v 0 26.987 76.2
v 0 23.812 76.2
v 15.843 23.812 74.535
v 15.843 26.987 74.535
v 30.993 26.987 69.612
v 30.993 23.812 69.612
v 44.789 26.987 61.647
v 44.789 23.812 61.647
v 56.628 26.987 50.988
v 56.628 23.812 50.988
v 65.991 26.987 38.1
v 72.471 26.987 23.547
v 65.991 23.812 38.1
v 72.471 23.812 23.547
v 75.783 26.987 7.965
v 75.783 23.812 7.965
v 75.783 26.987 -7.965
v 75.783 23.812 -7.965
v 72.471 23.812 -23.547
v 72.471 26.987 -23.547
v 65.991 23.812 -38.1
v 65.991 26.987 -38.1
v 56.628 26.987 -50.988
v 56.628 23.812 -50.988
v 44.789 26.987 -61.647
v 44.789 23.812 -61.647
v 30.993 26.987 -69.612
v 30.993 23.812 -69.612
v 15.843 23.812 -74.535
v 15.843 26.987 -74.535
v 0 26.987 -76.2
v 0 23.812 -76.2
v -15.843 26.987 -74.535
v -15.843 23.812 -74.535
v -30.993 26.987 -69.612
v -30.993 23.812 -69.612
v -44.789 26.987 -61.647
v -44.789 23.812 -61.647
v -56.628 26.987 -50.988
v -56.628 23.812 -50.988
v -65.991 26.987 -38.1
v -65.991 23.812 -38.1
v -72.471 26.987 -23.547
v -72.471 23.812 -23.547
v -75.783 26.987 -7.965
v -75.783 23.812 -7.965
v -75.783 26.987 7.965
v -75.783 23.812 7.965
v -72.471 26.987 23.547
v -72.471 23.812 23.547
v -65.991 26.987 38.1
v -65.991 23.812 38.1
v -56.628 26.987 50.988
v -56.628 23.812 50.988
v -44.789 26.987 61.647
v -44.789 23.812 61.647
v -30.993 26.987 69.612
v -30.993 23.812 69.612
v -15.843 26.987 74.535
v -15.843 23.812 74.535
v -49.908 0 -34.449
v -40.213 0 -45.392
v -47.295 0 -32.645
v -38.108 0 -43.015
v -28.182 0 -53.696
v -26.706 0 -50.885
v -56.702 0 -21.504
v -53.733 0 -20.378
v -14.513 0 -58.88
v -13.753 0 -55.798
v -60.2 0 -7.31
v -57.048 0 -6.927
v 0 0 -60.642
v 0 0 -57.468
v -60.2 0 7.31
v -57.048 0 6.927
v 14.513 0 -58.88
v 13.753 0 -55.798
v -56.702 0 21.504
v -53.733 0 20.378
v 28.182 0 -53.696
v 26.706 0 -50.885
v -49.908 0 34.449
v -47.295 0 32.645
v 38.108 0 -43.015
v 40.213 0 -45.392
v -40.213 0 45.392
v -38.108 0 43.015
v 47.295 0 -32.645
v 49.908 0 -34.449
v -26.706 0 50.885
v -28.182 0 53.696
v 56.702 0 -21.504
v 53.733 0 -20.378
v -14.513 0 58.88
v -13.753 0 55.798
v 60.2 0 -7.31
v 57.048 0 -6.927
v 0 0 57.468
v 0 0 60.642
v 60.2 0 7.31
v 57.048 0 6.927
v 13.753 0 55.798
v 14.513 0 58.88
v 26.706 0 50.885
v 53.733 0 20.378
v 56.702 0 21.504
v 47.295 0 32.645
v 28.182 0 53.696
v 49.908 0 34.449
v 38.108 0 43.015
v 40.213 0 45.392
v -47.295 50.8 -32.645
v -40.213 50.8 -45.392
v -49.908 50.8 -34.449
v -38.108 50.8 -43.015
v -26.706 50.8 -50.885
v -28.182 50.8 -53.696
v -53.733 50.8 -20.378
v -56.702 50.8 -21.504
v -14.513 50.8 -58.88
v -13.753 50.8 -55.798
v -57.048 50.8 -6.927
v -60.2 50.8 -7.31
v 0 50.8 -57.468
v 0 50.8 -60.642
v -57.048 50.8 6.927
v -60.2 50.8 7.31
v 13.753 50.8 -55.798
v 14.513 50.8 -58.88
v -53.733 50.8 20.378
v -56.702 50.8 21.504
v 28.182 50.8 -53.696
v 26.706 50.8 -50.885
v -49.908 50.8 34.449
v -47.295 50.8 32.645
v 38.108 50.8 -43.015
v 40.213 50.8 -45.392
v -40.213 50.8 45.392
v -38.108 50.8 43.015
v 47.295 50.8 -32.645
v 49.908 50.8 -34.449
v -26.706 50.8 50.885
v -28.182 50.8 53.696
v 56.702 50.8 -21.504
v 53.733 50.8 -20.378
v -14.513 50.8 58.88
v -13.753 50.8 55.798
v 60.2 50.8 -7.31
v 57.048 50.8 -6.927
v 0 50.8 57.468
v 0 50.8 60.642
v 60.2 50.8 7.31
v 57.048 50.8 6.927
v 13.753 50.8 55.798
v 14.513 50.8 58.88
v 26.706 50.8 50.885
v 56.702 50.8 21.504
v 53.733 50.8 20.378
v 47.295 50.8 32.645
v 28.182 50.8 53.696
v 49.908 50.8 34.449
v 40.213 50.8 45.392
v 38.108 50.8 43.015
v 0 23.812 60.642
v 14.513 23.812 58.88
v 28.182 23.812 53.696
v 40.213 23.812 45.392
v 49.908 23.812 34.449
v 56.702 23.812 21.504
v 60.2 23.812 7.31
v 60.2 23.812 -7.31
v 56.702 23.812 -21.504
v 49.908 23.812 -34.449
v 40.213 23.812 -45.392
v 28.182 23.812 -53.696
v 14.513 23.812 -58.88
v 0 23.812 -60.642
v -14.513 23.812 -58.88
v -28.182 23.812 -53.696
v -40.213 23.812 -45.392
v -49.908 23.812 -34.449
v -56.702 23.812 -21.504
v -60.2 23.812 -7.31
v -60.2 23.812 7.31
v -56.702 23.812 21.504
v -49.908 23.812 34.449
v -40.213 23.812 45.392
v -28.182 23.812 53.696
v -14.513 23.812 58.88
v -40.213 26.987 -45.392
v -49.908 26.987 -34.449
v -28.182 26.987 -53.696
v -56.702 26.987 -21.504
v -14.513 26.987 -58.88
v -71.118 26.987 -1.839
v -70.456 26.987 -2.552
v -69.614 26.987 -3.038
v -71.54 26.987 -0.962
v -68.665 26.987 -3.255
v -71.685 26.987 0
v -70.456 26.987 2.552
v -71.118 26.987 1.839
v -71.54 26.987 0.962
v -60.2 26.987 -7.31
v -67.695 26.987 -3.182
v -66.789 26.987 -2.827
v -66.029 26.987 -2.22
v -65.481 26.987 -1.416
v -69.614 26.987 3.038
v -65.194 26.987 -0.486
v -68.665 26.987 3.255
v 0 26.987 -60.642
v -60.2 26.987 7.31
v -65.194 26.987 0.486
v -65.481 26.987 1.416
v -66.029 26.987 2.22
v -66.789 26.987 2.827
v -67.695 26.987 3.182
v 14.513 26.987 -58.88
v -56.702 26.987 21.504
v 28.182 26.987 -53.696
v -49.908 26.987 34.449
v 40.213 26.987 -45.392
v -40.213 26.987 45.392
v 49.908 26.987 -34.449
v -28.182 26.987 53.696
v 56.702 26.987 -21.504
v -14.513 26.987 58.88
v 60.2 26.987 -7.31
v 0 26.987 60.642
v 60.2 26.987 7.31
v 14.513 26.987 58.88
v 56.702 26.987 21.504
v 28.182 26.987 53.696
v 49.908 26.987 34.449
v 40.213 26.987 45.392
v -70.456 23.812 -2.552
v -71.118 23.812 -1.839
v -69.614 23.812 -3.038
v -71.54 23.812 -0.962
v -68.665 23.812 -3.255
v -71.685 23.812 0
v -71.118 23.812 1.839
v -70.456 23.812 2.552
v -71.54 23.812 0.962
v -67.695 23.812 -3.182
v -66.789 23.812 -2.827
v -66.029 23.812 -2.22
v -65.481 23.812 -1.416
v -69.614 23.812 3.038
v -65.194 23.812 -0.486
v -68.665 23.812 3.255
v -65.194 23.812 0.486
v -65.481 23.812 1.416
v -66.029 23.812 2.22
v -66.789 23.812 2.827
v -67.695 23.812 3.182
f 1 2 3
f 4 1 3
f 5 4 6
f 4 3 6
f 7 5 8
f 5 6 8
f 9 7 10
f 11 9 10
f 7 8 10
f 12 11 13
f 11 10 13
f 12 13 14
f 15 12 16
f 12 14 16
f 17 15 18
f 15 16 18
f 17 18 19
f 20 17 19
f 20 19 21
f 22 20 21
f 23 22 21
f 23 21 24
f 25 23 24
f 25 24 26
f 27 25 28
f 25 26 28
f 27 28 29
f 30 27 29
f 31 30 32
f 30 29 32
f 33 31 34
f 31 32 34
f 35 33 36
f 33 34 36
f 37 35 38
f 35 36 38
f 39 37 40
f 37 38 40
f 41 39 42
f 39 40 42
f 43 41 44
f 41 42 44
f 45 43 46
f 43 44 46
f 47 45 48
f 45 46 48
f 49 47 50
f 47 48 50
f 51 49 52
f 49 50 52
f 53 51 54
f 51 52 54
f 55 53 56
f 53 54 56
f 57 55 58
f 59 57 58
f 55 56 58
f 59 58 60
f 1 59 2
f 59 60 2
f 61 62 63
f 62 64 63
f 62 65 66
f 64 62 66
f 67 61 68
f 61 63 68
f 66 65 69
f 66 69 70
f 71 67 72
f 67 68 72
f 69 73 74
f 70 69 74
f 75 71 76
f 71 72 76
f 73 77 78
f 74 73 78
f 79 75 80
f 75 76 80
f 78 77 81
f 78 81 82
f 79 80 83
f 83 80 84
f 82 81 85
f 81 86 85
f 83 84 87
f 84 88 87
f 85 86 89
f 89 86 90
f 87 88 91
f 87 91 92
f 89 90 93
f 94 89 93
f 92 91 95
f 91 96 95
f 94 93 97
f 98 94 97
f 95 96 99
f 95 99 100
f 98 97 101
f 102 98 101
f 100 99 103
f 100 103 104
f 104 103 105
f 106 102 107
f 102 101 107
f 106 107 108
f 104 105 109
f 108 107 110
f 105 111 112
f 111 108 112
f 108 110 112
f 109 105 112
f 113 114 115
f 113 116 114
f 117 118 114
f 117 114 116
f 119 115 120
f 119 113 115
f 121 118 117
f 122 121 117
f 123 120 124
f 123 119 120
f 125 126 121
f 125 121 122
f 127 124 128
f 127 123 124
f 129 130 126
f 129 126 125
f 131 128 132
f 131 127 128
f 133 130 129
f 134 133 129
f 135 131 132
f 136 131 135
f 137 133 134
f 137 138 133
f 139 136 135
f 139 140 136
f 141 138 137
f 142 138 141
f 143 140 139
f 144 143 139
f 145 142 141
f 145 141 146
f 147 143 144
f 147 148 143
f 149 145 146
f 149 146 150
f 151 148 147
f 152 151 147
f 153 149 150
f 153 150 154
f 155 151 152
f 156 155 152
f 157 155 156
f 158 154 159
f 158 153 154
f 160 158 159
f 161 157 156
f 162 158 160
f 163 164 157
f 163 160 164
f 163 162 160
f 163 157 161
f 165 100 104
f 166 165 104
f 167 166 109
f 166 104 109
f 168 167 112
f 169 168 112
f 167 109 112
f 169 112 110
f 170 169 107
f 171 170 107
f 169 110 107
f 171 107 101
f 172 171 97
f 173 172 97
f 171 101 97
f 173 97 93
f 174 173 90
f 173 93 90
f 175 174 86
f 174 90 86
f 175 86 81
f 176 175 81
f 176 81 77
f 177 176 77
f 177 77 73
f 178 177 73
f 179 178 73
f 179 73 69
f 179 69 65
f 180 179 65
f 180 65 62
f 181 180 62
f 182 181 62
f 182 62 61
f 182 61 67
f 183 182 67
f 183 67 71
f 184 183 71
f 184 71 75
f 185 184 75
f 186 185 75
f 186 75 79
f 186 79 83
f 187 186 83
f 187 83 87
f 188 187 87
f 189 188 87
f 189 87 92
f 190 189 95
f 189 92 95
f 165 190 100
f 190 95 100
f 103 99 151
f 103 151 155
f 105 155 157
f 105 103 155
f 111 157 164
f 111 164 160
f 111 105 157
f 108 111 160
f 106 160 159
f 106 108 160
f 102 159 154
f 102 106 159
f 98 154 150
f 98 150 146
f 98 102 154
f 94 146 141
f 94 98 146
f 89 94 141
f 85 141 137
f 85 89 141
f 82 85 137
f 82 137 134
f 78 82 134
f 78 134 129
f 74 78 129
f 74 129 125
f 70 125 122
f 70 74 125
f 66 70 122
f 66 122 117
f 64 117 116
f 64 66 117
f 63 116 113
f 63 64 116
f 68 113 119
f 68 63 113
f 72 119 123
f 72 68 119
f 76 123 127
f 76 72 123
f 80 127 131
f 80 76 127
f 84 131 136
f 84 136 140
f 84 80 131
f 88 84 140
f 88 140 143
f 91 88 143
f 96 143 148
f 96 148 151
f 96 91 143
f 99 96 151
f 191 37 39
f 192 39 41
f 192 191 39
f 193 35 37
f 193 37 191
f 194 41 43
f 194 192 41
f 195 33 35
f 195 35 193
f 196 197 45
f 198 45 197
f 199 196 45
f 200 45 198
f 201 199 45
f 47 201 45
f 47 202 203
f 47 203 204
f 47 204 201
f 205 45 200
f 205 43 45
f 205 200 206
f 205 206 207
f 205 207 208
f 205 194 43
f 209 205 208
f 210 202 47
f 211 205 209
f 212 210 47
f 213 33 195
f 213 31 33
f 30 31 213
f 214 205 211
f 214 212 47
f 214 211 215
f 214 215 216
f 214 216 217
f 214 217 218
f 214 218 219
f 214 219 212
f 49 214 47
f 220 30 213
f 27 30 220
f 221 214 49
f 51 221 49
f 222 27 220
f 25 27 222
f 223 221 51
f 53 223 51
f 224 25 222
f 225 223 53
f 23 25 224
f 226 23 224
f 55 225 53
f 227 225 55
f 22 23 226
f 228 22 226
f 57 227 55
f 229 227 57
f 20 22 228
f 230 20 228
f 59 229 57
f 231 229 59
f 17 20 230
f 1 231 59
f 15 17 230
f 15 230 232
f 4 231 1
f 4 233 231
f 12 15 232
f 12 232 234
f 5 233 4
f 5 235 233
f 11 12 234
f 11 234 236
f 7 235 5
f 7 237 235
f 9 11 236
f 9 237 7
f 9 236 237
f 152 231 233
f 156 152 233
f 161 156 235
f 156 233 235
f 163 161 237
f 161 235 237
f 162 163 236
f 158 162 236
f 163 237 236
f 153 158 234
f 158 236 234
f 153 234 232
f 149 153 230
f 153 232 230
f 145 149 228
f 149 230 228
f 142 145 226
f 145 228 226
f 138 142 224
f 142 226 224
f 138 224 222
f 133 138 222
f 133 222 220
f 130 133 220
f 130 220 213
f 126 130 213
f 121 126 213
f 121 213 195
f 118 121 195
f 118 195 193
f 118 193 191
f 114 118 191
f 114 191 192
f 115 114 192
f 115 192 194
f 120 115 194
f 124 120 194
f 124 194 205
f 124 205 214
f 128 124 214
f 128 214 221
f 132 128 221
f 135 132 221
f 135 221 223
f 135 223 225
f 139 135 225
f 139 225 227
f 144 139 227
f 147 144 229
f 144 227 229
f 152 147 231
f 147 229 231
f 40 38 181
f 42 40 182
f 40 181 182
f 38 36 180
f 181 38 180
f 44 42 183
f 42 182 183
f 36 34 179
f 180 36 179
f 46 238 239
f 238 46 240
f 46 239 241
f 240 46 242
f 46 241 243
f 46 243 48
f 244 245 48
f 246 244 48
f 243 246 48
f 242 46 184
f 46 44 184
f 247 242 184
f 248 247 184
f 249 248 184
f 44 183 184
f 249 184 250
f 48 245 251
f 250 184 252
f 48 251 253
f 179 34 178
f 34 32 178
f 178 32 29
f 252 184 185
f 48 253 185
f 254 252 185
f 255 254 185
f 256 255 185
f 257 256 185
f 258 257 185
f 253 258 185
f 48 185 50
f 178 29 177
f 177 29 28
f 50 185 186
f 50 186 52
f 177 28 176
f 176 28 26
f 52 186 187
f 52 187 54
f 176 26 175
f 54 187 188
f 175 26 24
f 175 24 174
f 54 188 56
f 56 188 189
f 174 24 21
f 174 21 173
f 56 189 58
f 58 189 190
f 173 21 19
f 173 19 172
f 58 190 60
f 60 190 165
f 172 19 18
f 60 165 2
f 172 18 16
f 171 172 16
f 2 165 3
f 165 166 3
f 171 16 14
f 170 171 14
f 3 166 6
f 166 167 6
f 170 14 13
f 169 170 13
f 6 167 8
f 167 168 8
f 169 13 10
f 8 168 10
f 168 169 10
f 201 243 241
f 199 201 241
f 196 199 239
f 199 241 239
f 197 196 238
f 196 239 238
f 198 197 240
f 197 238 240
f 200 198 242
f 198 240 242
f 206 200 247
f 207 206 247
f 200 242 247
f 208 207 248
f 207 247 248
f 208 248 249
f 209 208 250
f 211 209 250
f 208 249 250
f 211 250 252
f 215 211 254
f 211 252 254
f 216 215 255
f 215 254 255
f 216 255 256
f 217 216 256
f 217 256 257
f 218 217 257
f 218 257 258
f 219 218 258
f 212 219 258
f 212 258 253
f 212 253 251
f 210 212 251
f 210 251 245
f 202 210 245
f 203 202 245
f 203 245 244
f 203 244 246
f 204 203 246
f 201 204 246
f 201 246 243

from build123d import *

# Parameters (mm, degrees)
SKETCH1_R                   = 60.6425
SKETCH1_R_2                 = 57.4675
BOSS_EXTRUDE1_DEPTH         = 50.8
BOSS_EXTRUDE2_START         = -26.9875
SKETCH2_R                   = 76.2
SKETCH2_R_2                 = 60.6425
BOSS_EXTRUDE2_DEPTH         = 3.175
F_1_4_CLEARANCE_HOLE1_D     = 6.5278
F_1_4_CLEARANCE_HOLE1_DEPTH = 38.354
F_1_4_CLEARANCE_HOLE1_TIP   = 1.961148974


with BuildPart() as part:
    # Sketch1 → Boss-Extrude1 (new body)
    with BuildSketch(Plane(origin=(0, 0, 0), x_dir=(1, 0, 0), z_dir=(0, 1, 0))):
        with Locations(Location((0, 0, 0), (0, 0, 270))):
            Circle(SKETCH1_R)
        with Locations(Location((0, 0, 0), (0, 0, 270))):
            Circle(SKETCH1_R_2, mode=Mode.SUBTRACT)
    extrude(amount=BOSS_EXTRUDE1_DEPTH)

    # Sketch2 → Boss-Extrude2 (add)
    with BuildSketch(Plane(origin=(0, 50.8, 0), x_dir=(1, 0, 0), z_dir=(0, 1, 0)).offset(BOSS_EXTRUDE2_START)):
        with Locations(Location((0, 0, 0), (0, 0, 270))):
            Circle(SKETCH2_R)
        with Locations(Location((0, 0, 0), (0, 0, 270))):
            Circle(SKETCH2_R_2, mode=Mode.SUBTRACT)
    extrude(amount=BOSS_EXTRUDE2_DEPTH)

    # 1/4 Clearance Hole1
    with Locations(Plane(origin=(0, 26.9875, 0), x_dir=(1, 0, 0), z_dir=(0, 1, 0))):
        with Locations((-68.42125, 0)):
            Hole(F_1_4_CLEARANCE_HOLE1_D / 2, depth=F_1_4_CLEARANCE_HOLE1_DEPTH)
            with Locations((0, 0, -(F_1_4_CLEARANCE_HOLE1_DEPTH + F_1_4_CLEARANCE_HOLE1_TIP / 2))):  # 118° drill point
                Cone(0, F_1_4_CLEARANCE_HOLE1_D / 2, F_1_4_CLEARANCE_HOLE1_TIP, mode=Mode.SUBTRACT)


solid = part.part
